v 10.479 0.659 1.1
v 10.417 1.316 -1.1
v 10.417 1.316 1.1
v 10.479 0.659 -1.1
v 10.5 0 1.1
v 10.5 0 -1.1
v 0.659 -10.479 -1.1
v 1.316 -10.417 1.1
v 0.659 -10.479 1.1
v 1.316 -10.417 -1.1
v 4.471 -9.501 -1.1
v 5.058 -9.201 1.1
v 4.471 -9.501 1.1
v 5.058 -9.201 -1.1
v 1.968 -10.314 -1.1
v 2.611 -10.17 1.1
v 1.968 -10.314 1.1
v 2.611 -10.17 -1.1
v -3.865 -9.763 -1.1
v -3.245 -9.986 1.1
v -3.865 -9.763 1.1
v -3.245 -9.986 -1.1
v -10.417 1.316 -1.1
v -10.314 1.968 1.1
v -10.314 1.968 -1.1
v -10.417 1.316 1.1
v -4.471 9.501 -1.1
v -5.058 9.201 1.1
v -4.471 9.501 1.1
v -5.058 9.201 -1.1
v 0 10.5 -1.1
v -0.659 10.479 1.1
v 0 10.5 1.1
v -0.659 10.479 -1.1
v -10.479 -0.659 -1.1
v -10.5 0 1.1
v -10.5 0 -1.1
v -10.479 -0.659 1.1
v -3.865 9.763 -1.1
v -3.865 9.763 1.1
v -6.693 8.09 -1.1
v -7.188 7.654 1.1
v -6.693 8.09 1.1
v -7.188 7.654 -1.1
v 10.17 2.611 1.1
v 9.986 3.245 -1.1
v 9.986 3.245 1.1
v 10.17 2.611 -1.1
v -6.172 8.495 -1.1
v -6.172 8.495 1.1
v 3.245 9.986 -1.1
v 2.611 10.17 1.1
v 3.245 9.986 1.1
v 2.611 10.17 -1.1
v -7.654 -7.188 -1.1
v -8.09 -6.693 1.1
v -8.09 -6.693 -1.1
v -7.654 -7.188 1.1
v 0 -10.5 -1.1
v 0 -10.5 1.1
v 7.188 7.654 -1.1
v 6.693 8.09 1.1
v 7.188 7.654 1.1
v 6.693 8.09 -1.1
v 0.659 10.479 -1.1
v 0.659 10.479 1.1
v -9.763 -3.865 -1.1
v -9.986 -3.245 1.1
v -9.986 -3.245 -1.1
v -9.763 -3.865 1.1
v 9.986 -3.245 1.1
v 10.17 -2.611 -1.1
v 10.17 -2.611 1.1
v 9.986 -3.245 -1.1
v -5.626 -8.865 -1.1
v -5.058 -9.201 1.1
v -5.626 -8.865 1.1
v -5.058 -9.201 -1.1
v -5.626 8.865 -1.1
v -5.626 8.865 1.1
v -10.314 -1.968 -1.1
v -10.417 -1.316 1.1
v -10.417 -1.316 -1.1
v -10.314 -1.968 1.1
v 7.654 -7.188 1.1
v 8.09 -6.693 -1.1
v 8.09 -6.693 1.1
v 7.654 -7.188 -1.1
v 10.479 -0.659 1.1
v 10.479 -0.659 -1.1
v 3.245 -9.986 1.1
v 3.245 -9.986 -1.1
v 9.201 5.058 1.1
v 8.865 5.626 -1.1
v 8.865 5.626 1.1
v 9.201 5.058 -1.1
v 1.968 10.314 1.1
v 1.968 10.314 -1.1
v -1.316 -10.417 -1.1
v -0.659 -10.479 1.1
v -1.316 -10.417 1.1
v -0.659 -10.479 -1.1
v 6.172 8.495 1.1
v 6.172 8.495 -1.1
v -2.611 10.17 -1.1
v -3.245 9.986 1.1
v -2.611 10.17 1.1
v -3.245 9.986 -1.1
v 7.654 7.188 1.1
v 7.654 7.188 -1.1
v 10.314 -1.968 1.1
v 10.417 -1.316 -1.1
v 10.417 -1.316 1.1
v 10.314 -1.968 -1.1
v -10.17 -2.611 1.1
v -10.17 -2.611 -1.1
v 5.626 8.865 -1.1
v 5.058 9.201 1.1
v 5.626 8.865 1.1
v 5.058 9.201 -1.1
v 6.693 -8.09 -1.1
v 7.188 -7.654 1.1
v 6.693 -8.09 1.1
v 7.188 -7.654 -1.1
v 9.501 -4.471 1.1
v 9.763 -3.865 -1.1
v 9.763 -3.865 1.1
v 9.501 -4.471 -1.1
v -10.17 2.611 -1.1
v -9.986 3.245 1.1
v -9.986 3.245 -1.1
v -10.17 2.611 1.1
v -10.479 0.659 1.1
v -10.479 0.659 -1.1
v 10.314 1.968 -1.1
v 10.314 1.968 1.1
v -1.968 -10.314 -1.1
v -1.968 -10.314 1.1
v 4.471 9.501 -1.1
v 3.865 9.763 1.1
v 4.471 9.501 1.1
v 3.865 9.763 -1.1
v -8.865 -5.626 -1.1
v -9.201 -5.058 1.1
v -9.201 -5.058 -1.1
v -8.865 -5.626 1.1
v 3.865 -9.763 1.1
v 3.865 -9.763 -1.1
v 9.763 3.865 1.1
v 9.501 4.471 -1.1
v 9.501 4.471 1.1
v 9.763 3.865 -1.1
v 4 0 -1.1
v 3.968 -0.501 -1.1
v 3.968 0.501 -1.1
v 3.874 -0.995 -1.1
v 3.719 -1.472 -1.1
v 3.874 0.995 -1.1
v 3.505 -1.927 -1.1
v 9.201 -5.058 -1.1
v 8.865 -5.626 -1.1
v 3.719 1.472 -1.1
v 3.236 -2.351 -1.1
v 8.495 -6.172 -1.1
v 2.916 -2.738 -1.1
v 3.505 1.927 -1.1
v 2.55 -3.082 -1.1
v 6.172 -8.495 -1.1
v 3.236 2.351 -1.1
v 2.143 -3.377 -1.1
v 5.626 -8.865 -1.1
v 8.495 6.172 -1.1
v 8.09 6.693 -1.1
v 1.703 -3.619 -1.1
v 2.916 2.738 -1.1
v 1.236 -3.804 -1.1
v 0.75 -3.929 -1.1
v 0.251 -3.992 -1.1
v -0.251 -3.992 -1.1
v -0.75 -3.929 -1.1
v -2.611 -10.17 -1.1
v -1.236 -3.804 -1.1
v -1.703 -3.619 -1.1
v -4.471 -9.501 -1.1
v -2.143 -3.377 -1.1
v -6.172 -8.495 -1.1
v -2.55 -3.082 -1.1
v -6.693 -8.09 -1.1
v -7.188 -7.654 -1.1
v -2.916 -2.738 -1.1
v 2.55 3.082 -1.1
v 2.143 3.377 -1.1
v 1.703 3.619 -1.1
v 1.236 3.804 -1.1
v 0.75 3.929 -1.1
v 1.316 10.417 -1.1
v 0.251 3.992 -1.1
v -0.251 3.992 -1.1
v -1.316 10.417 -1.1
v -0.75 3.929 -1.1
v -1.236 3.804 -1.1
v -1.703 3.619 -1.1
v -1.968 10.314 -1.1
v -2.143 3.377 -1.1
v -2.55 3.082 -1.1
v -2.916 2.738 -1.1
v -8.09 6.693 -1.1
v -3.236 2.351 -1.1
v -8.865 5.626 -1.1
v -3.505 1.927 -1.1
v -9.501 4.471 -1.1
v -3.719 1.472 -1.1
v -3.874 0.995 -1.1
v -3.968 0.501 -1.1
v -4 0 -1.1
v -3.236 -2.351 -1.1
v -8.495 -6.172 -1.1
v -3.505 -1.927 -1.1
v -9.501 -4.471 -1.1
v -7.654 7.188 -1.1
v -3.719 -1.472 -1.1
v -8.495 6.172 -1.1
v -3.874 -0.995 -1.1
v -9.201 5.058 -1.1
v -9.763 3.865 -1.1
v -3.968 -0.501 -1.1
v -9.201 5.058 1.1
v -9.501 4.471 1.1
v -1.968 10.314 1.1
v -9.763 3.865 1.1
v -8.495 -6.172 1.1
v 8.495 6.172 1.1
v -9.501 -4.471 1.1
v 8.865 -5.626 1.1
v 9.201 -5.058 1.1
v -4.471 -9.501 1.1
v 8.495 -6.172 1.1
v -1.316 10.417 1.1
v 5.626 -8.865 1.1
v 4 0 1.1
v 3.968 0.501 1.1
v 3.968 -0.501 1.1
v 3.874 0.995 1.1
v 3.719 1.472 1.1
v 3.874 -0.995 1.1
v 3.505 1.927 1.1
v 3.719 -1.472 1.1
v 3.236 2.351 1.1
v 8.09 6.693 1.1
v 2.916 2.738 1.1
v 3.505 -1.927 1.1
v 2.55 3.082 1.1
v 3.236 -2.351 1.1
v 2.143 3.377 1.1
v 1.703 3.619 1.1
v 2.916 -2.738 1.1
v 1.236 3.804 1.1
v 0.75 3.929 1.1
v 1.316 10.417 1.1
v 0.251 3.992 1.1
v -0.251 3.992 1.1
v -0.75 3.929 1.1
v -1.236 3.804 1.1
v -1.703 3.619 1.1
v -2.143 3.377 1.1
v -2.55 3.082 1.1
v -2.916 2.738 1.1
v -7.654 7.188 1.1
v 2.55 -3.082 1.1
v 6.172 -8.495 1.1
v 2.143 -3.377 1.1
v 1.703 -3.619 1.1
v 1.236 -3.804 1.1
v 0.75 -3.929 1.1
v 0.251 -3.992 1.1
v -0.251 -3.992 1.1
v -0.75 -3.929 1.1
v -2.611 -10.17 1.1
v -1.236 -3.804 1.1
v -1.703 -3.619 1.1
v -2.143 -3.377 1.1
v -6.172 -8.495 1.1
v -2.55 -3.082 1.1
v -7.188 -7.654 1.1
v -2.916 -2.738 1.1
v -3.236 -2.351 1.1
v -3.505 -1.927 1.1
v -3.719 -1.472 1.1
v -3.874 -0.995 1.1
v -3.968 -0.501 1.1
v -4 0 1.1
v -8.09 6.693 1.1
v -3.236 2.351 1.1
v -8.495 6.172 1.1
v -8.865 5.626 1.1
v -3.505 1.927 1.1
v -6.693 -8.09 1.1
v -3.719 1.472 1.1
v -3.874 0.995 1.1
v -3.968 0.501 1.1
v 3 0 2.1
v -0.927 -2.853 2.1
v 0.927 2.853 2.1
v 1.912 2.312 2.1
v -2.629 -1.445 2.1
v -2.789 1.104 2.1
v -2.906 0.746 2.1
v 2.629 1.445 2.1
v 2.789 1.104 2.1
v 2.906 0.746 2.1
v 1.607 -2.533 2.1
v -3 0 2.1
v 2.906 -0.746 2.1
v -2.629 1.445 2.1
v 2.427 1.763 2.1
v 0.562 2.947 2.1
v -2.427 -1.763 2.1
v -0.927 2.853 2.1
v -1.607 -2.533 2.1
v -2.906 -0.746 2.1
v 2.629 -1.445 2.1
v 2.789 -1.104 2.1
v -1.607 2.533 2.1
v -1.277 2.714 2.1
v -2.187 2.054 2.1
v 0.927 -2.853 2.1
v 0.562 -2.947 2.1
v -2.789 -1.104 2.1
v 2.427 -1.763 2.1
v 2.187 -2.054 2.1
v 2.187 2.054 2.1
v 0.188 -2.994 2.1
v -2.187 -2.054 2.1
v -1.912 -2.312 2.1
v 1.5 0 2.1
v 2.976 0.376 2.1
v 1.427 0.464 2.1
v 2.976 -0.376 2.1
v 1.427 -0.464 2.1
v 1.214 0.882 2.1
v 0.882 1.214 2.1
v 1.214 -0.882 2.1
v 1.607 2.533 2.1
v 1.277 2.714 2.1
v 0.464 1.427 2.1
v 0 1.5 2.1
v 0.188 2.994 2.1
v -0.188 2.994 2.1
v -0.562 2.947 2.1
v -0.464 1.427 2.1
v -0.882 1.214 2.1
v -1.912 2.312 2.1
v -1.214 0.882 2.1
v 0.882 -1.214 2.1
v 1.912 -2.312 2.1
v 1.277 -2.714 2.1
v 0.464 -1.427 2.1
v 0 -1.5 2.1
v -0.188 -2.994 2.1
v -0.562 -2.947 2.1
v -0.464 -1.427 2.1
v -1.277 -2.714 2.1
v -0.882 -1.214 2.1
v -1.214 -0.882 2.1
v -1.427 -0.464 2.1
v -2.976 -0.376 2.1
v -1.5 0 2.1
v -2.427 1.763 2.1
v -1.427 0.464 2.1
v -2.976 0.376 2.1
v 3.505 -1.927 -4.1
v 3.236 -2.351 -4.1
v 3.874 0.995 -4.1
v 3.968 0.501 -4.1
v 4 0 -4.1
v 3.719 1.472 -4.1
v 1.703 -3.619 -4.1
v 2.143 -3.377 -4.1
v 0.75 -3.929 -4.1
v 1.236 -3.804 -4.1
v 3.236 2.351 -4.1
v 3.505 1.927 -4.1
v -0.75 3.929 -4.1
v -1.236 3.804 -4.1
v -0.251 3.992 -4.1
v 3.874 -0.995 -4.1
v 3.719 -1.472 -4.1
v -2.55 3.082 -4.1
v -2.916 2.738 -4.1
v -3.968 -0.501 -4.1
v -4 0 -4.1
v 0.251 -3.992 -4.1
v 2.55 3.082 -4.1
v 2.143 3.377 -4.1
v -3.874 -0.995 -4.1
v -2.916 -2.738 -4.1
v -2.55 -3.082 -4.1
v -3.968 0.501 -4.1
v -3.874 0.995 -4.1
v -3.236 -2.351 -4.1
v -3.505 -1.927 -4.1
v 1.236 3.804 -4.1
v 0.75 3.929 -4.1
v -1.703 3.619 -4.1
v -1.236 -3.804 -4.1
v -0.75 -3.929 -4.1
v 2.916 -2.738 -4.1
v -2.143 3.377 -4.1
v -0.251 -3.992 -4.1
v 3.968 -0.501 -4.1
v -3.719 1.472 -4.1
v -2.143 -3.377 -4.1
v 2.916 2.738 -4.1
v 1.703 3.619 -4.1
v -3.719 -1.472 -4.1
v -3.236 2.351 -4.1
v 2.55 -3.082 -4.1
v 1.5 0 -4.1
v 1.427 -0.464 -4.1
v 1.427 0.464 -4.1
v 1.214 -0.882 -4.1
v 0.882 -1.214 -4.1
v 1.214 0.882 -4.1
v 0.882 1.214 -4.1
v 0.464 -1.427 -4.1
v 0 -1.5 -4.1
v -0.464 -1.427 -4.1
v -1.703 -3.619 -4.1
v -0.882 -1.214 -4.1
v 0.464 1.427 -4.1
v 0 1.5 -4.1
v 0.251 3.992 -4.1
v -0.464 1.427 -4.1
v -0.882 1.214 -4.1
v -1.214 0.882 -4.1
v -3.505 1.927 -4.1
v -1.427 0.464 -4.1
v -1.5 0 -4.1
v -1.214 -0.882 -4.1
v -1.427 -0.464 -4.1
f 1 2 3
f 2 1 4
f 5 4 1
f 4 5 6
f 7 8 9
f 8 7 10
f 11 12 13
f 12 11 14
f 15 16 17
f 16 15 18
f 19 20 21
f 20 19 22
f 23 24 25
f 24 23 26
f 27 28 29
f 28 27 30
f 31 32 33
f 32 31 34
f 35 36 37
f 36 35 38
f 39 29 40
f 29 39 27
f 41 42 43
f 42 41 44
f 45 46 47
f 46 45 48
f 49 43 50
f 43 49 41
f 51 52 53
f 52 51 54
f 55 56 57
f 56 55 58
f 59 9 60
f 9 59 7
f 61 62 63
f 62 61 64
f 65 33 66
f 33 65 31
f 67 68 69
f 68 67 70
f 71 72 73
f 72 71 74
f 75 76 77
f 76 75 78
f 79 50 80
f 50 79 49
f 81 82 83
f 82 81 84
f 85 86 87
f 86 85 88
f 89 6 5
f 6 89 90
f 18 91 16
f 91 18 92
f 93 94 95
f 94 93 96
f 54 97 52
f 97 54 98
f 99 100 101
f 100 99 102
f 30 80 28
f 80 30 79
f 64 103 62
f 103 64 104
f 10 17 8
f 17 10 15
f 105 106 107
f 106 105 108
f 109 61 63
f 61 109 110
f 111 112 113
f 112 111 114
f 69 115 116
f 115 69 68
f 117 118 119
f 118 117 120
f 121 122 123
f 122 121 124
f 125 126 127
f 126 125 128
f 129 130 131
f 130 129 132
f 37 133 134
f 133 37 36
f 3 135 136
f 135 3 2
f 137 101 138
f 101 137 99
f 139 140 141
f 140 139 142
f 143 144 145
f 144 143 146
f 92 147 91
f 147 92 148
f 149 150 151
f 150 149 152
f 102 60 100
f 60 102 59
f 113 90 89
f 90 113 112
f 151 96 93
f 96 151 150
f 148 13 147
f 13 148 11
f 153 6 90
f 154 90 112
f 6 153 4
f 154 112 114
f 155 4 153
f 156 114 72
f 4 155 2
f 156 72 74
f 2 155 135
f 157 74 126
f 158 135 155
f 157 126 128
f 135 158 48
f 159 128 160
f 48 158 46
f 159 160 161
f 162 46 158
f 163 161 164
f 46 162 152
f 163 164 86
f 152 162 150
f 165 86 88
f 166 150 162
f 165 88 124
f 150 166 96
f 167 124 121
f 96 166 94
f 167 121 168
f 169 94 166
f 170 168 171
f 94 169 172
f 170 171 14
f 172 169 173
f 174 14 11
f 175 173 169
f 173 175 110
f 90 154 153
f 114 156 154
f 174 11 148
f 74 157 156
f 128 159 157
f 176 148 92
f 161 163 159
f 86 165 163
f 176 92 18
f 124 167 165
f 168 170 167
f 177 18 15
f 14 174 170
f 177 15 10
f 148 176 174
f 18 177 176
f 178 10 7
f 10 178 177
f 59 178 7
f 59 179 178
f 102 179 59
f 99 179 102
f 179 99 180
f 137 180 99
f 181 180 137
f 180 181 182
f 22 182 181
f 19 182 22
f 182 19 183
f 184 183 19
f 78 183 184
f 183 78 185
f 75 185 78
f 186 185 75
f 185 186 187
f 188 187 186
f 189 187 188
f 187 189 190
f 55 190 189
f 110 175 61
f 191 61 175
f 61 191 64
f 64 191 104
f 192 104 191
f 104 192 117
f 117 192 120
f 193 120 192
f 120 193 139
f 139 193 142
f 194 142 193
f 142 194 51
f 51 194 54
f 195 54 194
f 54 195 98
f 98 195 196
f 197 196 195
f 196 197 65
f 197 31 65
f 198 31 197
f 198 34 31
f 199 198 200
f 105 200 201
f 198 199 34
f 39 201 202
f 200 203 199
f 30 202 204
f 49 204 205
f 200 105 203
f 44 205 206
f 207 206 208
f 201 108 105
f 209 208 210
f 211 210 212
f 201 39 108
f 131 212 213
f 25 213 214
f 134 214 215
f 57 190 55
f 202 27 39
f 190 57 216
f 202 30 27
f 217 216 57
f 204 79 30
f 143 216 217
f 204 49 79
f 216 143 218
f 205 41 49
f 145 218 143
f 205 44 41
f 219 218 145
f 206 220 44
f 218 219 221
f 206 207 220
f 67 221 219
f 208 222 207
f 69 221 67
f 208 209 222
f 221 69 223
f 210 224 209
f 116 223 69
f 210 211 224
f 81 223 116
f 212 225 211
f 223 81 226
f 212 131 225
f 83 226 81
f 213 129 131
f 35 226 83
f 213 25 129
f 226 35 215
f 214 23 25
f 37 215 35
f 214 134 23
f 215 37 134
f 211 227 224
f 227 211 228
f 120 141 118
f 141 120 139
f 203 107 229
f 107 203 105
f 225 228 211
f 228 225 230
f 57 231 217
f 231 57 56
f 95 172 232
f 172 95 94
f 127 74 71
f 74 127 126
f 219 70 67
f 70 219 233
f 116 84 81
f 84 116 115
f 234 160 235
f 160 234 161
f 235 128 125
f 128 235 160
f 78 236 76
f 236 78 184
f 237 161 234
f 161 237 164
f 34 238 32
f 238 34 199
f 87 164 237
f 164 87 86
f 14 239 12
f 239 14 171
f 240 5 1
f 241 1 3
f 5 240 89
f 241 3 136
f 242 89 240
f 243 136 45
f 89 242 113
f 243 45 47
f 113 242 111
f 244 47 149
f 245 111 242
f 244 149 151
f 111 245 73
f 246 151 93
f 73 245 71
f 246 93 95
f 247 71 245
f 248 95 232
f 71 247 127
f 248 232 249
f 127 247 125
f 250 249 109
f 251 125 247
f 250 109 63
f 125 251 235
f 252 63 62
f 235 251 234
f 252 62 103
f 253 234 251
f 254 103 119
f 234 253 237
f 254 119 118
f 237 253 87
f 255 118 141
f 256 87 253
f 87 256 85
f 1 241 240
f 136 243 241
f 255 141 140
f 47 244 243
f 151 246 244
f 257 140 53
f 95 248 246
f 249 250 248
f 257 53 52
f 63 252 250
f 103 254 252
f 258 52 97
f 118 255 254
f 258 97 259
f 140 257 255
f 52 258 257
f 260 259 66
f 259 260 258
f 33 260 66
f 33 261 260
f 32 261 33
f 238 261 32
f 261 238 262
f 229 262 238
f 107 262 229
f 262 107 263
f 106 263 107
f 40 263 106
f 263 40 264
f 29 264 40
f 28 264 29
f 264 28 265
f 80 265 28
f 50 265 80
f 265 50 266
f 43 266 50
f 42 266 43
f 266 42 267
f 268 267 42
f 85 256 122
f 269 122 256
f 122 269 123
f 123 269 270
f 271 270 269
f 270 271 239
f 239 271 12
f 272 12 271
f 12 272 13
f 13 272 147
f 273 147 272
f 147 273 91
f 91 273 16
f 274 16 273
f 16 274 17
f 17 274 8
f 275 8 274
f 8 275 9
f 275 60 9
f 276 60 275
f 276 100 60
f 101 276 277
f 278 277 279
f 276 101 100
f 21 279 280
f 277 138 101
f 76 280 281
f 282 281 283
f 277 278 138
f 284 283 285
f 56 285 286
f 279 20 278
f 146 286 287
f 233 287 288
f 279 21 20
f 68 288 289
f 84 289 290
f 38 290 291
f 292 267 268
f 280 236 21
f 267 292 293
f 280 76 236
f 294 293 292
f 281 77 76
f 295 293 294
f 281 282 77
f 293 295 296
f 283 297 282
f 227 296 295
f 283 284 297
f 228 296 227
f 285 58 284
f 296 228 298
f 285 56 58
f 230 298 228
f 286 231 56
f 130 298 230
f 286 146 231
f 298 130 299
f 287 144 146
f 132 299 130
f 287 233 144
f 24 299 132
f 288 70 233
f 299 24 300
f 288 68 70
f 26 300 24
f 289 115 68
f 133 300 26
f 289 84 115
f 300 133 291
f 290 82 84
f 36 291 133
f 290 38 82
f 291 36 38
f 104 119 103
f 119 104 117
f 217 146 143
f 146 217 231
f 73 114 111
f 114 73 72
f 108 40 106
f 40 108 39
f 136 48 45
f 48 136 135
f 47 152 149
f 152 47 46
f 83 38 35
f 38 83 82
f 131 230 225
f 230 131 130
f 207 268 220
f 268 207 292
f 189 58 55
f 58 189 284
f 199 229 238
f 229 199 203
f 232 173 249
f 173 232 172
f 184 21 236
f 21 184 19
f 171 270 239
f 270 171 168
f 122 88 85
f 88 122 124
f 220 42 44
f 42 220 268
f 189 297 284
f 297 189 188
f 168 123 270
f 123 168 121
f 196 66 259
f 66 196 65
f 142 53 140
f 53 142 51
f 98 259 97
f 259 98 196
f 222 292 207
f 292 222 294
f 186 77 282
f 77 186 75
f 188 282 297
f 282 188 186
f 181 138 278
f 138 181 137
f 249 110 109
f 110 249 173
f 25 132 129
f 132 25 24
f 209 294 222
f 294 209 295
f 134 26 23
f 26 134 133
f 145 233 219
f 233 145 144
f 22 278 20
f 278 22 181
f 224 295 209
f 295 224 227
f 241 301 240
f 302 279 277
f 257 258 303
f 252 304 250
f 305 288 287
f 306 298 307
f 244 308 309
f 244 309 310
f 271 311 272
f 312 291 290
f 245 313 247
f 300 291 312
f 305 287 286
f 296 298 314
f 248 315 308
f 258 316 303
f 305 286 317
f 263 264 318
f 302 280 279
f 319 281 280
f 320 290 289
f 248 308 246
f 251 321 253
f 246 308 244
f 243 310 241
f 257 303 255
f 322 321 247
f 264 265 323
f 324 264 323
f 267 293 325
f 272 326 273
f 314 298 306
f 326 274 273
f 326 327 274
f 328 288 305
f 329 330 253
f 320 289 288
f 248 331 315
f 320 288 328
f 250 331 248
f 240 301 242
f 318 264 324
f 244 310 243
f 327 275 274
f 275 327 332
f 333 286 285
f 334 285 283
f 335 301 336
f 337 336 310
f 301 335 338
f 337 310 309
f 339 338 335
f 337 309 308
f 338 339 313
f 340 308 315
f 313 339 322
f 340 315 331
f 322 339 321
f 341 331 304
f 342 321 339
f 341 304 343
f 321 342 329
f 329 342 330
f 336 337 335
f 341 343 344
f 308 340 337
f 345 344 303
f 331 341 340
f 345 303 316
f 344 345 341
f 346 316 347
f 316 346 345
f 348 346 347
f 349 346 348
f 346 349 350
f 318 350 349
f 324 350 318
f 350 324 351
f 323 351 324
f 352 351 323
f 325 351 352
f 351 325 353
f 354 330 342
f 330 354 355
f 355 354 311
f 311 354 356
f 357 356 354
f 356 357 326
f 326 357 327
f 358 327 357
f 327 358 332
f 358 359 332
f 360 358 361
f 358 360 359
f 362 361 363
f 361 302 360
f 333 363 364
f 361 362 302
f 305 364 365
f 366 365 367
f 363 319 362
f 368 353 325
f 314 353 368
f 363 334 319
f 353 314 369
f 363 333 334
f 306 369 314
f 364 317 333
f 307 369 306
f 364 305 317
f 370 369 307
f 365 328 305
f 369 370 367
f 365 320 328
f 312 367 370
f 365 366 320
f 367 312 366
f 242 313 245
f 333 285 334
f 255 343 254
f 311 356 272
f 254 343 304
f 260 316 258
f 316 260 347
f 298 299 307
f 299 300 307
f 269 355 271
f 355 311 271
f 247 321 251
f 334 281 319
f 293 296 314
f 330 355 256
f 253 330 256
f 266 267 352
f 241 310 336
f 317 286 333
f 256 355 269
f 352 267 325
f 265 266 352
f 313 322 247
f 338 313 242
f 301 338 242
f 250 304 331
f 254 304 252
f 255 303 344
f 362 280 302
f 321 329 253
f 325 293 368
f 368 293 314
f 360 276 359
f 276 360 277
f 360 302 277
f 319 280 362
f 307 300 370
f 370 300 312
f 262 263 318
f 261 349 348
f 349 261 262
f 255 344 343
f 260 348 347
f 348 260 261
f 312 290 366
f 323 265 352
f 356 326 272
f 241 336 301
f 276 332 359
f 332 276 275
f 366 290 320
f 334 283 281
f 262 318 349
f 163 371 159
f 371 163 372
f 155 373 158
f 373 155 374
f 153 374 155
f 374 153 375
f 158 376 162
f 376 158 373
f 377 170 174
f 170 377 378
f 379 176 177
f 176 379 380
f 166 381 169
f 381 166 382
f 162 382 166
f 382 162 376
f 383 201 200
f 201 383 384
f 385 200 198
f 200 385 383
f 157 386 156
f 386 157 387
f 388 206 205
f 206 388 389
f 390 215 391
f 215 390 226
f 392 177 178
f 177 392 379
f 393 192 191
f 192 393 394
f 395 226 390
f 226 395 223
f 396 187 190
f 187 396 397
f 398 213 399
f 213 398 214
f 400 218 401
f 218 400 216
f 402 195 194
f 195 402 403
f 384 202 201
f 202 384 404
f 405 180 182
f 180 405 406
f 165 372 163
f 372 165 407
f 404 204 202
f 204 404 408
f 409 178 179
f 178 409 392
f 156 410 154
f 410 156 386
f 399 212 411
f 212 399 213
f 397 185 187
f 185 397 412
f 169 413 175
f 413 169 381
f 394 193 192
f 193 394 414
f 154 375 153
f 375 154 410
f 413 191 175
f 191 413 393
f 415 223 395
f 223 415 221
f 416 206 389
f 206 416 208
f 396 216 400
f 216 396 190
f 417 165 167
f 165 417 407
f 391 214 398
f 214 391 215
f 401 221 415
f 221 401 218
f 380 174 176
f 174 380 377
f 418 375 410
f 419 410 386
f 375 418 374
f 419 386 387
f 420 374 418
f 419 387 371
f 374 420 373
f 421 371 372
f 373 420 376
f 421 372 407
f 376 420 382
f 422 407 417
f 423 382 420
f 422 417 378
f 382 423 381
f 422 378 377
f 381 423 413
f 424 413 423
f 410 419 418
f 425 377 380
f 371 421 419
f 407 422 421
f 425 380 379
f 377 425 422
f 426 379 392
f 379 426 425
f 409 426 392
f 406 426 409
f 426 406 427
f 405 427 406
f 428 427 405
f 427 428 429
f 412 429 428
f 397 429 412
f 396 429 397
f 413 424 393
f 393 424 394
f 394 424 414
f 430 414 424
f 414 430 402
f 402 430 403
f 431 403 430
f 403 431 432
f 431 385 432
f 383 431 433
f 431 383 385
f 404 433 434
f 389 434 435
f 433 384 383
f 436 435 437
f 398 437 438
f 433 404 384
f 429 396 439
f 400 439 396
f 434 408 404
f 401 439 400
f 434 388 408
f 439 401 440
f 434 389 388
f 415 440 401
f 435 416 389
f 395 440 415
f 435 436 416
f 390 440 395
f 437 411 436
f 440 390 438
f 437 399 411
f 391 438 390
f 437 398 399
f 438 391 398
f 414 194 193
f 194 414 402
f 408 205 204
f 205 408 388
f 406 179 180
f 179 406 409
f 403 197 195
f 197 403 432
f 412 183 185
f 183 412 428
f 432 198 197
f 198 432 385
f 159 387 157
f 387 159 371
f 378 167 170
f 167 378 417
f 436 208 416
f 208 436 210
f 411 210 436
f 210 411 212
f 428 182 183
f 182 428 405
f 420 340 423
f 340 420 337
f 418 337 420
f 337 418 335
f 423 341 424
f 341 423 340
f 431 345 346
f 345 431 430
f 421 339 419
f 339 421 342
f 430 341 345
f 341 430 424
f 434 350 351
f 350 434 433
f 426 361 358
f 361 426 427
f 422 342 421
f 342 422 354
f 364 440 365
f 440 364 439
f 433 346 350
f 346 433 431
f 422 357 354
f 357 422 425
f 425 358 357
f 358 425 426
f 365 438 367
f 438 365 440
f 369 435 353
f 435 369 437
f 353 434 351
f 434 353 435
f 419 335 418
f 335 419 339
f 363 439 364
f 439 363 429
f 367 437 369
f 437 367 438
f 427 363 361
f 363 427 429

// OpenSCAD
horn_diam = 21;
horn_th = 2.2;

shaft_diam = 8;
shaft_th = 3;
shaft_drill = 3;

top_th = 1;
top_diam1 = 8;
top_diam2 = 6; 

extra = 10;

difference() {

  //-- MAin body
  union() {
  
    //-- Rounded horn
    cylinder(r = horn_diam/2, h = horn_th, center = true, $fn = 100);

    //-- Top part
    translate([0,0, top_th/2 + horn_th/2])
    cylinder(r2 = top_diam2/2, r1 = top_diam1/2, h = 1, center = true, $fn = 50);

    //-- Shaft
    translate([0,0,-horn_th/2 - shaft_th/2])
    cylinder(r = shaft_diam/2, h = shaft_th, center = true, $fn = 50);

  }
  
  //-- Drill
  cylinder(r = shaft_drill/2, h = shaft_th + horn_th + top_th + extra, center = true, $fn =20);

}
